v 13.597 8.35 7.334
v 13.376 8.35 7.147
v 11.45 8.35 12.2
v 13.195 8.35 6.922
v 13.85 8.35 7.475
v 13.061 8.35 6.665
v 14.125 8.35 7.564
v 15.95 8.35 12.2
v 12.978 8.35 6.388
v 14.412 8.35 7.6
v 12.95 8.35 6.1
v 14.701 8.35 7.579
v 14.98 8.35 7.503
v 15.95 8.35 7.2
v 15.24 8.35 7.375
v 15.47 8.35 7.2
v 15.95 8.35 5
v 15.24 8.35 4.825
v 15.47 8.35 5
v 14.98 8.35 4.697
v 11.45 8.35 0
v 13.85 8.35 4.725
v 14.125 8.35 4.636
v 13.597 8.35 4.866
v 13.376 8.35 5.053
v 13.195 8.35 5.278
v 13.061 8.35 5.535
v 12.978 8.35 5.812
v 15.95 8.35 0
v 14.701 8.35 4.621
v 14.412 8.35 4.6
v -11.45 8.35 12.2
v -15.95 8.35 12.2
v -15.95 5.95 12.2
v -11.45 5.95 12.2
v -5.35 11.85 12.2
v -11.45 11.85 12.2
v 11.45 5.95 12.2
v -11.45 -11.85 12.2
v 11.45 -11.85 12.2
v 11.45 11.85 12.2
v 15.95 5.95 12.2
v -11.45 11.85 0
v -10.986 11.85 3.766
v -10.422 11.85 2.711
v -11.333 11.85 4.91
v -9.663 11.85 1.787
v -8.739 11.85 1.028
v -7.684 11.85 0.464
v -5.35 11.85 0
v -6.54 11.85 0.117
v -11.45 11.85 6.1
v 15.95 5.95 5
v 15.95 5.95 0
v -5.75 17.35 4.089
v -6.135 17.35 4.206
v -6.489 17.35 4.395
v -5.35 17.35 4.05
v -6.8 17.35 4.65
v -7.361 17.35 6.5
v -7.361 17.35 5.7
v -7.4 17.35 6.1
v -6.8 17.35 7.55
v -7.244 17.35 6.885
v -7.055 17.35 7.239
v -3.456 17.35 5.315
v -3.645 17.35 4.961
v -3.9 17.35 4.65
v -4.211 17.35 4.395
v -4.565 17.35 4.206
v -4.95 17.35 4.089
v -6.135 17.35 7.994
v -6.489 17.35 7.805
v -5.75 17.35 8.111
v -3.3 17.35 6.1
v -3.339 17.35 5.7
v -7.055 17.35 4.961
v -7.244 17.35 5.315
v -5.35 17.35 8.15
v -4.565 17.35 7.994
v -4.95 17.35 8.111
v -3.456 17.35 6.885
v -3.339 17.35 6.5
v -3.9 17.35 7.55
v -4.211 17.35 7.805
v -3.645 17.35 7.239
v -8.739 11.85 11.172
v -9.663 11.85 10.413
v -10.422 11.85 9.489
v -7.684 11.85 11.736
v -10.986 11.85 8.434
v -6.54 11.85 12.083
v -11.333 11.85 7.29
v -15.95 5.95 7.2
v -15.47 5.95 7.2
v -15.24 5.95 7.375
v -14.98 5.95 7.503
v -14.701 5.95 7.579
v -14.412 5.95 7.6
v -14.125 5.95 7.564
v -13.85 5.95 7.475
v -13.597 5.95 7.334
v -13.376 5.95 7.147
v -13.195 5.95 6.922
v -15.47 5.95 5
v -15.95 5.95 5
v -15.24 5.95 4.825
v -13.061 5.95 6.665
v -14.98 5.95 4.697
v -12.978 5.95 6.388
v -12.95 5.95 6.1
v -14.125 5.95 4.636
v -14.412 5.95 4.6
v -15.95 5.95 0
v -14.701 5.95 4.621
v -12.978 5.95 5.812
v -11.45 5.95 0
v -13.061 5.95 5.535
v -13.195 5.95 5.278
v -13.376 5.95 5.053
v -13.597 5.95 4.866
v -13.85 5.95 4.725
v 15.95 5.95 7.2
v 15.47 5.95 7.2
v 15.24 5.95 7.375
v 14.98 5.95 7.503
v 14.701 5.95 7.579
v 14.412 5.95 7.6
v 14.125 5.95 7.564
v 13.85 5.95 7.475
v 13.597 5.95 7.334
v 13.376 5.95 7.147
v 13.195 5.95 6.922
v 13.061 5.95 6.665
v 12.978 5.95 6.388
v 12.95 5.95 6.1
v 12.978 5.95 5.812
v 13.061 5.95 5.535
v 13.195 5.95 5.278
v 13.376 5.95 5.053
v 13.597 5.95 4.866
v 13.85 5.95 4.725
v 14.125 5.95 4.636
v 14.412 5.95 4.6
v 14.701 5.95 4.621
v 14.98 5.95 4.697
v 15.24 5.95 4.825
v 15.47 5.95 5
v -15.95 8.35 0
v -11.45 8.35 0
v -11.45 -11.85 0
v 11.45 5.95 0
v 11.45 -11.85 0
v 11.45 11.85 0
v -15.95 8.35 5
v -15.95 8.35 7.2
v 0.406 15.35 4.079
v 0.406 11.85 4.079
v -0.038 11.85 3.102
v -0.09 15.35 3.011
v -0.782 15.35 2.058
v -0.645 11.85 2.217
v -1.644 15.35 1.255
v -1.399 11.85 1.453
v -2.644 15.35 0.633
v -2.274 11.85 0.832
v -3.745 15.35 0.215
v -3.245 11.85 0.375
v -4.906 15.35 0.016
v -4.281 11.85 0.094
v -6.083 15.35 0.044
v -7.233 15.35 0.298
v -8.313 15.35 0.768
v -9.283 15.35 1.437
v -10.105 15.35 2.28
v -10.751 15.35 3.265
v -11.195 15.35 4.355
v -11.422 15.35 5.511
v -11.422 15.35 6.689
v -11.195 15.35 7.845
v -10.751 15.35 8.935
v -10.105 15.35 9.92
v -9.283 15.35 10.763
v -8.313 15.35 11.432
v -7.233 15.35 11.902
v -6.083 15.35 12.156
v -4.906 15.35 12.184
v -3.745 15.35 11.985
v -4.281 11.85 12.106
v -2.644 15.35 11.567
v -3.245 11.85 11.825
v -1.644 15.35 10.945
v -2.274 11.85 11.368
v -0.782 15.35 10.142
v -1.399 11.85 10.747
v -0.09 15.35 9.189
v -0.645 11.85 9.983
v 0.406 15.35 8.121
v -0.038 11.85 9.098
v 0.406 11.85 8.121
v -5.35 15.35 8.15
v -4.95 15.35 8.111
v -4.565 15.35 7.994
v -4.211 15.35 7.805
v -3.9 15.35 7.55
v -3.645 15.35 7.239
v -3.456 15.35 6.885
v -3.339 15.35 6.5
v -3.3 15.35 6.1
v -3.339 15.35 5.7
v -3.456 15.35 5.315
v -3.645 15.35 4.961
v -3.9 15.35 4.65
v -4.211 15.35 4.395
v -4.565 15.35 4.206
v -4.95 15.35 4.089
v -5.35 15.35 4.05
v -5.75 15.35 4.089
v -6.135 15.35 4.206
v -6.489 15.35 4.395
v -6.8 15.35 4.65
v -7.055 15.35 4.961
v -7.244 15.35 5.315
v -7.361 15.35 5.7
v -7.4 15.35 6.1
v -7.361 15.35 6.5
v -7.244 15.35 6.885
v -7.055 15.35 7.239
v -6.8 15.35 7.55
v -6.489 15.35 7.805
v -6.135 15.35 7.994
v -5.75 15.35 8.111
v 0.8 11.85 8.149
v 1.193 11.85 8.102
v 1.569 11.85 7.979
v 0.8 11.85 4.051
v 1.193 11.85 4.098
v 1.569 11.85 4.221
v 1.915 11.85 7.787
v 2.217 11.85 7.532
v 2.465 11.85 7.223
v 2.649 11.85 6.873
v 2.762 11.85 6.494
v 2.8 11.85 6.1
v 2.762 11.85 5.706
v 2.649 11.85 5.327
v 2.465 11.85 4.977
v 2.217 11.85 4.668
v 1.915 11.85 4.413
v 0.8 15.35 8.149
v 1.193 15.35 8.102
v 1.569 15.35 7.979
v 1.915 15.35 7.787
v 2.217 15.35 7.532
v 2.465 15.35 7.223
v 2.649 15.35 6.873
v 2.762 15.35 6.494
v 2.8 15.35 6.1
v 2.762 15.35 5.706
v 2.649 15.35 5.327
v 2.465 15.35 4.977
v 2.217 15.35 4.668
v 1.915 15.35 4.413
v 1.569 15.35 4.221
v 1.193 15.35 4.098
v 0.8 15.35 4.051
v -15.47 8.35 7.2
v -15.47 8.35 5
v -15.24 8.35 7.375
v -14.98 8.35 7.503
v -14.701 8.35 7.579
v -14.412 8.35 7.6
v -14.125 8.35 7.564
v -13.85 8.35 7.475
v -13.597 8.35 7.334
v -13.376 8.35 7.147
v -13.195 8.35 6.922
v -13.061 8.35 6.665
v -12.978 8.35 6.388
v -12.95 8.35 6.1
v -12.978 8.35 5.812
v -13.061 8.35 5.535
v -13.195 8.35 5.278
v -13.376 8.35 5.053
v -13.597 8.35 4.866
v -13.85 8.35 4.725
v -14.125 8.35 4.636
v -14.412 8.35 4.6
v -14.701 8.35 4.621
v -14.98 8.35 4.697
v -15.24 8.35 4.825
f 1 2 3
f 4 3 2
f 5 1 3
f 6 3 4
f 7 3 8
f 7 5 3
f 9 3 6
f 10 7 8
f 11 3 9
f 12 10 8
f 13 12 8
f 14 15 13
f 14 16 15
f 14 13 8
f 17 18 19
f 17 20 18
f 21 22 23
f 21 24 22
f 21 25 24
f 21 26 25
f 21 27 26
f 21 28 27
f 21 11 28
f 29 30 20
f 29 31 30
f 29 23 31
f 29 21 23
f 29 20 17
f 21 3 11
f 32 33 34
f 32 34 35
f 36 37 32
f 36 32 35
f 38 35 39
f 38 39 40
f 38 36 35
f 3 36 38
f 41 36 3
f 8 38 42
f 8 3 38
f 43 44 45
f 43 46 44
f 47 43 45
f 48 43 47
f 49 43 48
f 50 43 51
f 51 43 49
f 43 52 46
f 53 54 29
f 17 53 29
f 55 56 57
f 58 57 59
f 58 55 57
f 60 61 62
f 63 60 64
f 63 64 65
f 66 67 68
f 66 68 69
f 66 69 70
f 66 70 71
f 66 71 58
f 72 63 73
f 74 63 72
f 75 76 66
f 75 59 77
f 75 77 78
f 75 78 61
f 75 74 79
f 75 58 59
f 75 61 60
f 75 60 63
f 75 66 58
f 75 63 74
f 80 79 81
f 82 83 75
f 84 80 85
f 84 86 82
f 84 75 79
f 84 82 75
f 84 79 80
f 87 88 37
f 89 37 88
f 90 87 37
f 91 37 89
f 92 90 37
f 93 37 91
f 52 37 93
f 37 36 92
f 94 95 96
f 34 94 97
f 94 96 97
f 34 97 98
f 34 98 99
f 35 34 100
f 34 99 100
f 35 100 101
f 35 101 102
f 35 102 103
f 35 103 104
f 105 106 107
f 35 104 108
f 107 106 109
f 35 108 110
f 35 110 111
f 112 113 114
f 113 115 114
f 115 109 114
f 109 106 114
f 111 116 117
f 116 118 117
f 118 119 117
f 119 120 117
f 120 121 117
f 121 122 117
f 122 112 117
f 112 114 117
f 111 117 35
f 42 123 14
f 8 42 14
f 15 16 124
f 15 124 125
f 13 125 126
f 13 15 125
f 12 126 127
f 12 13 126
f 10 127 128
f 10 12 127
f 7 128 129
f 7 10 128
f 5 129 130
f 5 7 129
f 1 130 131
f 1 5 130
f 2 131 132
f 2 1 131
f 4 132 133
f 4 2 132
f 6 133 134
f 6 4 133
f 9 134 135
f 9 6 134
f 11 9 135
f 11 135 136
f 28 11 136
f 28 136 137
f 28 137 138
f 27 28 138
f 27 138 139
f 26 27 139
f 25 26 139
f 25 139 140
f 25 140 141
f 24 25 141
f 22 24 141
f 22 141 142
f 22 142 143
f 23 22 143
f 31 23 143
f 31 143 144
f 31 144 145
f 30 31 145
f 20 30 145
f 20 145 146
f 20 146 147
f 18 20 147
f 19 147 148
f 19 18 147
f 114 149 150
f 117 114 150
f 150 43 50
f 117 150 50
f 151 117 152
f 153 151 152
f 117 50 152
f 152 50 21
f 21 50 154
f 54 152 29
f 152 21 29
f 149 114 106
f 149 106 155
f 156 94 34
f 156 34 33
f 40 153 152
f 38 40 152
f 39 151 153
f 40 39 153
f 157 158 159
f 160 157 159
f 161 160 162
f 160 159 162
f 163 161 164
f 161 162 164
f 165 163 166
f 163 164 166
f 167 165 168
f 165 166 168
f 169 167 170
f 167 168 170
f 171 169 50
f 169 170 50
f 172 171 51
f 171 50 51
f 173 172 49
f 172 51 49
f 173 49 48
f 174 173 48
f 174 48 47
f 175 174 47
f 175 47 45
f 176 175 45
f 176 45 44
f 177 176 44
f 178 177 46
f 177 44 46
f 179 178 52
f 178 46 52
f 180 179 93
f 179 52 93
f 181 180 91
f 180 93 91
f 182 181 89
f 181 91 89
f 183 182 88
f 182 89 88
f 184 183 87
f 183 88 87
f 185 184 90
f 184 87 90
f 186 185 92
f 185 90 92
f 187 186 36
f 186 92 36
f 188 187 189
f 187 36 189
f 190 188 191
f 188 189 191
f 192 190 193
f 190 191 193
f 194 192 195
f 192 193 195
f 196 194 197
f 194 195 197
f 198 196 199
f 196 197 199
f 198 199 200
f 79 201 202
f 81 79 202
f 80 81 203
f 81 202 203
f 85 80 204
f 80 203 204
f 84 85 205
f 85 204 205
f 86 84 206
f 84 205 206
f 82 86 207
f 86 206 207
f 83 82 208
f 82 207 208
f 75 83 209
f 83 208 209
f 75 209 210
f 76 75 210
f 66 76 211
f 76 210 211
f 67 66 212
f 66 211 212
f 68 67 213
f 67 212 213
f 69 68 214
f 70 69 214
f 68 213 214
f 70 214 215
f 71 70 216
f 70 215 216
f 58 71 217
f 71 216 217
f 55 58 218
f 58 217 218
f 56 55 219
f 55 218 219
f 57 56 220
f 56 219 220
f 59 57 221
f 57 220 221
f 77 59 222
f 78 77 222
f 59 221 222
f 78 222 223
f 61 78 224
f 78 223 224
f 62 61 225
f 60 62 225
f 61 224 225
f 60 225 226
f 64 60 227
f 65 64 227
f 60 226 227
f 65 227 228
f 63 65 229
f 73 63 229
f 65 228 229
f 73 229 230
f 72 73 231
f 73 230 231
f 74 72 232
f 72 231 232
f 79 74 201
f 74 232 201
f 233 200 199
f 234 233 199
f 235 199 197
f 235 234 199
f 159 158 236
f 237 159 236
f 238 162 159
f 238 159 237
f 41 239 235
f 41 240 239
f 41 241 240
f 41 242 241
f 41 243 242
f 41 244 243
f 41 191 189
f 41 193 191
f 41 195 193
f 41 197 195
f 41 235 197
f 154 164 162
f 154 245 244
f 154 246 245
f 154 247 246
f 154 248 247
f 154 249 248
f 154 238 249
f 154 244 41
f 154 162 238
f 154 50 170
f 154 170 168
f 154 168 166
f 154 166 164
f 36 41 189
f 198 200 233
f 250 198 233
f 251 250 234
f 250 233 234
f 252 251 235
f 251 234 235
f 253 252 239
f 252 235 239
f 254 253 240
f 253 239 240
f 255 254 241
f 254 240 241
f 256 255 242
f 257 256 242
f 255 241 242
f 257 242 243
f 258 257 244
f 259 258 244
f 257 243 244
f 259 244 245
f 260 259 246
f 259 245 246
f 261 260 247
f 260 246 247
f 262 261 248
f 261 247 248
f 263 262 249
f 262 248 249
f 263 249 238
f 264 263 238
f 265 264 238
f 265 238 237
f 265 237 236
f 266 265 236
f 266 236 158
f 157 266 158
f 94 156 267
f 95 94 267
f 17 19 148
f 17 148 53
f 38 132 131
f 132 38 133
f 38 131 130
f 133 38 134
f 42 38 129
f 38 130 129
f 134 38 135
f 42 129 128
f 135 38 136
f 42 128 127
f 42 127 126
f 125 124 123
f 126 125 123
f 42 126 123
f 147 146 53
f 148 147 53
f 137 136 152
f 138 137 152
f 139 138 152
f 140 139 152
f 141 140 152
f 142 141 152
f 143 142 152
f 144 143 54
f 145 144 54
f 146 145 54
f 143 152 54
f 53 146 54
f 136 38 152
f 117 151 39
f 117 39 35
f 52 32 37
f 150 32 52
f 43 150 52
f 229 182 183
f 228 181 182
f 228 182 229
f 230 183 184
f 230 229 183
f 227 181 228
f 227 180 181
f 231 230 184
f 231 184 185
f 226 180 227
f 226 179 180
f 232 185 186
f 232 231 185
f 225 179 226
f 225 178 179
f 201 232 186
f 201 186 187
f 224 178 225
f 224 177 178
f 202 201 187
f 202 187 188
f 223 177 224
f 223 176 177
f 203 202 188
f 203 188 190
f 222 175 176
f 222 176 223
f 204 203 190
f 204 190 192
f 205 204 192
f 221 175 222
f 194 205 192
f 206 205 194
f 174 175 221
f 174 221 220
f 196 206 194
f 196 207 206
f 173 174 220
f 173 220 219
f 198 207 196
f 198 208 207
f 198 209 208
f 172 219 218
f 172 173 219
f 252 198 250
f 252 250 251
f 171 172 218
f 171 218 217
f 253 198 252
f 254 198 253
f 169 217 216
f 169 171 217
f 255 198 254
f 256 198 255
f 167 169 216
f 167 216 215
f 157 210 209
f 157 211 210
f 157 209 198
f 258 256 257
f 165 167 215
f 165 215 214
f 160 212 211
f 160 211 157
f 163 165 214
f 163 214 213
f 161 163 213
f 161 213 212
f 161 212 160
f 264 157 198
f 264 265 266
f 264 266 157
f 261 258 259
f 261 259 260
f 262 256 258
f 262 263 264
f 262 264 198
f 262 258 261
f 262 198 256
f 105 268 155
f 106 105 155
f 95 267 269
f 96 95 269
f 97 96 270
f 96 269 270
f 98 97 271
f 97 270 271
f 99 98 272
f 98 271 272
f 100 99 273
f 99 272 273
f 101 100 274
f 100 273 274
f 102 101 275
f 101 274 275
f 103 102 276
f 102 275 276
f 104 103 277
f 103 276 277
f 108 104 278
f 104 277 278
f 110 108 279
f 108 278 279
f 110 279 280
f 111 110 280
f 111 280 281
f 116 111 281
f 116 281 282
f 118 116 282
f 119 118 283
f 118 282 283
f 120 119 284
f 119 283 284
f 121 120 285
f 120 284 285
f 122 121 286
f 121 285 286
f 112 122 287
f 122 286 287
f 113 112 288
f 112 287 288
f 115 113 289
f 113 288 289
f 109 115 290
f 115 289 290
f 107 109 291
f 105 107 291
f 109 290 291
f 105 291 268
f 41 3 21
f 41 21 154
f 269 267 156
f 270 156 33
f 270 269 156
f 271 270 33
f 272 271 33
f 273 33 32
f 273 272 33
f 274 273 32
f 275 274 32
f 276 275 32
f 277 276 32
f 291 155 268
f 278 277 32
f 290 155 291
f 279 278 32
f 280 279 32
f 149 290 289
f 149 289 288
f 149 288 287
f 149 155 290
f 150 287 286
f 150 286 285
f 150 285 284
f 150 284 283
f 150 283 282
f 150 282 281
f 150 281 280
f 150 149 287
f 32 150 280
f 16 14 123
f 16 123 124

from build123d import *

# Parameters (mm, degrees)
CROQUIS1_W              = 22.9
CROQUIS1_H              = 23.7
CROQUIS1_W_2            = 4.5
CROQUIS1_H_2            = 2.4
SALIENTE_EXTRUIR1_DEPTH = 12.2
CROQUIS2_R              = 6.1
CROQUIS2_R_2            = 2.05
SALIENTE_EXTRUIR2_DEPTH = 3.5
SALIENTE_EXTRUIR3_START = 3.5
CROQUIS2_3_R            = 2.05
SALIENTE_EXTRUIR3_DEPTH = 2
CORTAR_EXTRUIR2_REACH   = 30.483
CROQUIS3_R              = 1.5


with BuildPart() as part:
    # Croquis1 → Saliente-Extruir1 (new body)
    with BuildSketch(Plane.XY):
        Rectangle(CROQUIS1_W, CROQUIS1_H)
        with Locations((-13.7, 7.15)):
            Rectangle(CROQUIS1_W_2, CROQUIS1_H_2)
        with Locations((13.7, 7.15)):
            Rectangle(CROQUIS1_W_2, CROQUIS1_H_2)
    extrude(amount=SALIENTE_EXTRUIR1_DEPTH)

    # Croquis2 → Saliente-Extruir2 (add)
    # profile 1 of 3: a face of its own
    with BuildSketch(Plane(origin=(0, 11.85, 0), x_dir=(1, 0, 0), z_dir=(0, 1, 0))):
        with BuildLine():
            ThreePointArc((0.405532787, -4.079148115), (0.663266583, -5.075), (0.75, -6.1))
            ThreePointArc((0.75, -6.1), (0.663266583, -7.125), (0.405532787, -8.120851885))
            ThreePointArc((0.405532787, -8.120851885), (2.8, -6.1), (0.405532787, -4.079148115))
        make_face()
    # profile 2 of 3: a face of its own
    with BuildSketch(Plane(origin=(0, 11.85, 0), x_dir=(1, 0, 0), z_dir=(0, 1, 0))):
        with Locations((-5.35, -6.1)):
            Circle(CROQUIS2_R)
        with Locations((-5.35, -6.1)):
            Circle(CROQUIS2_R_2, mode=Mode.SUBTRACT)
    # profile 3 of 3: a face of its own
    with BuildSketch(Plane(origin=(0, 11.85, 0), x_dir=(1, 0, 0), z_dir=(0, 1, 0))):
        with Locations((-5.35, -6.1)):
            Circle(CROQUIS2_R_2)
    extrude(amount=SALIENTE_EXTRUIR2_DEPTH)

    # Croquis2<3> → Saliente-Extruir3 (add)
    with BuildSketch(Plane(origin=(0, 11.85, 0), x_dir=(1, 0, 0), z_dir=(0, 1, 0)).offset(SALIENTE_EXTRUIR3_START)):
        with Locations(Location((-5.35, -6.1, 0), (0, 0, 270))):
            Circle(CROQUIS2_3_R)
    extrude(amount=SALIENTE_EXTRUIR3_DEPTH)

    # Croquis3 → Cortar-Extruir2 (cut, up to next)
    with BuildSketch(Plane(origin=(0, 8.35, 0), x_dir=(1, 0, 0), z_dir=(0, 1, 0)), mode=Mode.PRIVATE) as cortar_extruir2_sk1:
        with Locations((-14.45, -6.1)):
            Circle(CROQUIS3_R)
    cortar_extruir2_tool1 = extrude(cortar_extruir2_sk1.sketch, amount=-CORTAR_EXTRUIR2_REACH, mode=Mode.PRIVATE) & part.part
    # Croquis3 → Cortar-Extruir2 (cut, up to next)
    with BuildSketch(Plane(origin=(0, 8.35, 0), x_dir=(1, 0, 0), z_dir=(0, 1, 0)), mode=Mode.PRIVATE) as cortar_extruir2_sk2:
        with BuildLine():
            ThreePointArc((-15.469803903, -7.2), (-15.824719218, -6.700122548), (-15.95, -6.1))
            Line((-15.95, -6.1), (-15.95, -7.2))
            Line((-15.95, -7.2), (-15.469803903, -7.2))
        make_face()
    cortar_extruir2_tool2 = extrude(cortar_extruir2_sk2.sketch, amount=-CORTAR_EXTRUIR2_REACH, mode=Mode.PRIVATE) & part.part
    # Croquis3 → Cortar-Extruir2 (cut, up to next)
    with BuildSketch(Plane(origin=(0, 8.35, 0), x_dir=(1, 0, 0), z_dir=(0, 1, 0)), mode=Mode.PRIVATE) as cortar_extruir2_sk3:
        with BuildLine():
            Line((-15.469803903, -5), (-15.95, -5))
            Line((-15.95, -5), (-15.95, -6.1))
            ThreePointArc((-15.95, -6.1), (-15.824719218, -5.499877452), (-15.469803903, -5))
        make_face()
    cortar_extruir2_tool3 = extrude(cortar_extruir2_sk3.sketch, amount=-CORTAR_EXTRUIR2_REACH, mode=Mode.PRIVATE) & part.part
    cortar_extruir2_1 = cortar_extruir2_tool1.solids().sort_by_distance((-14.45, 8.35, 6.1))[0]
    add(cortar_extruir2_1, mode=Mode.SUBTRACT)
    cortar_extruir2_2 = cortar_extruir2_tool2.solids().sort_by_distance((-15.810988, 8.35, 6.934581))[0]
    add(cortar_extruir2_2, mode=Mode.SUBTRACT)
    cortar_extruir2_3 = cortar_extruir2_tool3.solids().sort_by_distance((-15.810988, 8.35, 5.265419))[0]
    add(cortar_extruir2_3, mode=Mode.SUBTRACT)
    cortar_extruir2 = cortar_extruir2_1 + cortar_extruir2_2 + cortar_extruir2_3  # Cortar-Extruir2 as one shape, for the pattern or mirror that repeats it

    # Simetría1: Cortar-Extruir2 across plane
    add(cortar_extruir2.mirror(Plane(origin=(0, 0, 0), x_dir=(0, 0, 1), z_dir=(1, 0, 0))), mode=Mode.SUBTRACT)


solid = part.part
